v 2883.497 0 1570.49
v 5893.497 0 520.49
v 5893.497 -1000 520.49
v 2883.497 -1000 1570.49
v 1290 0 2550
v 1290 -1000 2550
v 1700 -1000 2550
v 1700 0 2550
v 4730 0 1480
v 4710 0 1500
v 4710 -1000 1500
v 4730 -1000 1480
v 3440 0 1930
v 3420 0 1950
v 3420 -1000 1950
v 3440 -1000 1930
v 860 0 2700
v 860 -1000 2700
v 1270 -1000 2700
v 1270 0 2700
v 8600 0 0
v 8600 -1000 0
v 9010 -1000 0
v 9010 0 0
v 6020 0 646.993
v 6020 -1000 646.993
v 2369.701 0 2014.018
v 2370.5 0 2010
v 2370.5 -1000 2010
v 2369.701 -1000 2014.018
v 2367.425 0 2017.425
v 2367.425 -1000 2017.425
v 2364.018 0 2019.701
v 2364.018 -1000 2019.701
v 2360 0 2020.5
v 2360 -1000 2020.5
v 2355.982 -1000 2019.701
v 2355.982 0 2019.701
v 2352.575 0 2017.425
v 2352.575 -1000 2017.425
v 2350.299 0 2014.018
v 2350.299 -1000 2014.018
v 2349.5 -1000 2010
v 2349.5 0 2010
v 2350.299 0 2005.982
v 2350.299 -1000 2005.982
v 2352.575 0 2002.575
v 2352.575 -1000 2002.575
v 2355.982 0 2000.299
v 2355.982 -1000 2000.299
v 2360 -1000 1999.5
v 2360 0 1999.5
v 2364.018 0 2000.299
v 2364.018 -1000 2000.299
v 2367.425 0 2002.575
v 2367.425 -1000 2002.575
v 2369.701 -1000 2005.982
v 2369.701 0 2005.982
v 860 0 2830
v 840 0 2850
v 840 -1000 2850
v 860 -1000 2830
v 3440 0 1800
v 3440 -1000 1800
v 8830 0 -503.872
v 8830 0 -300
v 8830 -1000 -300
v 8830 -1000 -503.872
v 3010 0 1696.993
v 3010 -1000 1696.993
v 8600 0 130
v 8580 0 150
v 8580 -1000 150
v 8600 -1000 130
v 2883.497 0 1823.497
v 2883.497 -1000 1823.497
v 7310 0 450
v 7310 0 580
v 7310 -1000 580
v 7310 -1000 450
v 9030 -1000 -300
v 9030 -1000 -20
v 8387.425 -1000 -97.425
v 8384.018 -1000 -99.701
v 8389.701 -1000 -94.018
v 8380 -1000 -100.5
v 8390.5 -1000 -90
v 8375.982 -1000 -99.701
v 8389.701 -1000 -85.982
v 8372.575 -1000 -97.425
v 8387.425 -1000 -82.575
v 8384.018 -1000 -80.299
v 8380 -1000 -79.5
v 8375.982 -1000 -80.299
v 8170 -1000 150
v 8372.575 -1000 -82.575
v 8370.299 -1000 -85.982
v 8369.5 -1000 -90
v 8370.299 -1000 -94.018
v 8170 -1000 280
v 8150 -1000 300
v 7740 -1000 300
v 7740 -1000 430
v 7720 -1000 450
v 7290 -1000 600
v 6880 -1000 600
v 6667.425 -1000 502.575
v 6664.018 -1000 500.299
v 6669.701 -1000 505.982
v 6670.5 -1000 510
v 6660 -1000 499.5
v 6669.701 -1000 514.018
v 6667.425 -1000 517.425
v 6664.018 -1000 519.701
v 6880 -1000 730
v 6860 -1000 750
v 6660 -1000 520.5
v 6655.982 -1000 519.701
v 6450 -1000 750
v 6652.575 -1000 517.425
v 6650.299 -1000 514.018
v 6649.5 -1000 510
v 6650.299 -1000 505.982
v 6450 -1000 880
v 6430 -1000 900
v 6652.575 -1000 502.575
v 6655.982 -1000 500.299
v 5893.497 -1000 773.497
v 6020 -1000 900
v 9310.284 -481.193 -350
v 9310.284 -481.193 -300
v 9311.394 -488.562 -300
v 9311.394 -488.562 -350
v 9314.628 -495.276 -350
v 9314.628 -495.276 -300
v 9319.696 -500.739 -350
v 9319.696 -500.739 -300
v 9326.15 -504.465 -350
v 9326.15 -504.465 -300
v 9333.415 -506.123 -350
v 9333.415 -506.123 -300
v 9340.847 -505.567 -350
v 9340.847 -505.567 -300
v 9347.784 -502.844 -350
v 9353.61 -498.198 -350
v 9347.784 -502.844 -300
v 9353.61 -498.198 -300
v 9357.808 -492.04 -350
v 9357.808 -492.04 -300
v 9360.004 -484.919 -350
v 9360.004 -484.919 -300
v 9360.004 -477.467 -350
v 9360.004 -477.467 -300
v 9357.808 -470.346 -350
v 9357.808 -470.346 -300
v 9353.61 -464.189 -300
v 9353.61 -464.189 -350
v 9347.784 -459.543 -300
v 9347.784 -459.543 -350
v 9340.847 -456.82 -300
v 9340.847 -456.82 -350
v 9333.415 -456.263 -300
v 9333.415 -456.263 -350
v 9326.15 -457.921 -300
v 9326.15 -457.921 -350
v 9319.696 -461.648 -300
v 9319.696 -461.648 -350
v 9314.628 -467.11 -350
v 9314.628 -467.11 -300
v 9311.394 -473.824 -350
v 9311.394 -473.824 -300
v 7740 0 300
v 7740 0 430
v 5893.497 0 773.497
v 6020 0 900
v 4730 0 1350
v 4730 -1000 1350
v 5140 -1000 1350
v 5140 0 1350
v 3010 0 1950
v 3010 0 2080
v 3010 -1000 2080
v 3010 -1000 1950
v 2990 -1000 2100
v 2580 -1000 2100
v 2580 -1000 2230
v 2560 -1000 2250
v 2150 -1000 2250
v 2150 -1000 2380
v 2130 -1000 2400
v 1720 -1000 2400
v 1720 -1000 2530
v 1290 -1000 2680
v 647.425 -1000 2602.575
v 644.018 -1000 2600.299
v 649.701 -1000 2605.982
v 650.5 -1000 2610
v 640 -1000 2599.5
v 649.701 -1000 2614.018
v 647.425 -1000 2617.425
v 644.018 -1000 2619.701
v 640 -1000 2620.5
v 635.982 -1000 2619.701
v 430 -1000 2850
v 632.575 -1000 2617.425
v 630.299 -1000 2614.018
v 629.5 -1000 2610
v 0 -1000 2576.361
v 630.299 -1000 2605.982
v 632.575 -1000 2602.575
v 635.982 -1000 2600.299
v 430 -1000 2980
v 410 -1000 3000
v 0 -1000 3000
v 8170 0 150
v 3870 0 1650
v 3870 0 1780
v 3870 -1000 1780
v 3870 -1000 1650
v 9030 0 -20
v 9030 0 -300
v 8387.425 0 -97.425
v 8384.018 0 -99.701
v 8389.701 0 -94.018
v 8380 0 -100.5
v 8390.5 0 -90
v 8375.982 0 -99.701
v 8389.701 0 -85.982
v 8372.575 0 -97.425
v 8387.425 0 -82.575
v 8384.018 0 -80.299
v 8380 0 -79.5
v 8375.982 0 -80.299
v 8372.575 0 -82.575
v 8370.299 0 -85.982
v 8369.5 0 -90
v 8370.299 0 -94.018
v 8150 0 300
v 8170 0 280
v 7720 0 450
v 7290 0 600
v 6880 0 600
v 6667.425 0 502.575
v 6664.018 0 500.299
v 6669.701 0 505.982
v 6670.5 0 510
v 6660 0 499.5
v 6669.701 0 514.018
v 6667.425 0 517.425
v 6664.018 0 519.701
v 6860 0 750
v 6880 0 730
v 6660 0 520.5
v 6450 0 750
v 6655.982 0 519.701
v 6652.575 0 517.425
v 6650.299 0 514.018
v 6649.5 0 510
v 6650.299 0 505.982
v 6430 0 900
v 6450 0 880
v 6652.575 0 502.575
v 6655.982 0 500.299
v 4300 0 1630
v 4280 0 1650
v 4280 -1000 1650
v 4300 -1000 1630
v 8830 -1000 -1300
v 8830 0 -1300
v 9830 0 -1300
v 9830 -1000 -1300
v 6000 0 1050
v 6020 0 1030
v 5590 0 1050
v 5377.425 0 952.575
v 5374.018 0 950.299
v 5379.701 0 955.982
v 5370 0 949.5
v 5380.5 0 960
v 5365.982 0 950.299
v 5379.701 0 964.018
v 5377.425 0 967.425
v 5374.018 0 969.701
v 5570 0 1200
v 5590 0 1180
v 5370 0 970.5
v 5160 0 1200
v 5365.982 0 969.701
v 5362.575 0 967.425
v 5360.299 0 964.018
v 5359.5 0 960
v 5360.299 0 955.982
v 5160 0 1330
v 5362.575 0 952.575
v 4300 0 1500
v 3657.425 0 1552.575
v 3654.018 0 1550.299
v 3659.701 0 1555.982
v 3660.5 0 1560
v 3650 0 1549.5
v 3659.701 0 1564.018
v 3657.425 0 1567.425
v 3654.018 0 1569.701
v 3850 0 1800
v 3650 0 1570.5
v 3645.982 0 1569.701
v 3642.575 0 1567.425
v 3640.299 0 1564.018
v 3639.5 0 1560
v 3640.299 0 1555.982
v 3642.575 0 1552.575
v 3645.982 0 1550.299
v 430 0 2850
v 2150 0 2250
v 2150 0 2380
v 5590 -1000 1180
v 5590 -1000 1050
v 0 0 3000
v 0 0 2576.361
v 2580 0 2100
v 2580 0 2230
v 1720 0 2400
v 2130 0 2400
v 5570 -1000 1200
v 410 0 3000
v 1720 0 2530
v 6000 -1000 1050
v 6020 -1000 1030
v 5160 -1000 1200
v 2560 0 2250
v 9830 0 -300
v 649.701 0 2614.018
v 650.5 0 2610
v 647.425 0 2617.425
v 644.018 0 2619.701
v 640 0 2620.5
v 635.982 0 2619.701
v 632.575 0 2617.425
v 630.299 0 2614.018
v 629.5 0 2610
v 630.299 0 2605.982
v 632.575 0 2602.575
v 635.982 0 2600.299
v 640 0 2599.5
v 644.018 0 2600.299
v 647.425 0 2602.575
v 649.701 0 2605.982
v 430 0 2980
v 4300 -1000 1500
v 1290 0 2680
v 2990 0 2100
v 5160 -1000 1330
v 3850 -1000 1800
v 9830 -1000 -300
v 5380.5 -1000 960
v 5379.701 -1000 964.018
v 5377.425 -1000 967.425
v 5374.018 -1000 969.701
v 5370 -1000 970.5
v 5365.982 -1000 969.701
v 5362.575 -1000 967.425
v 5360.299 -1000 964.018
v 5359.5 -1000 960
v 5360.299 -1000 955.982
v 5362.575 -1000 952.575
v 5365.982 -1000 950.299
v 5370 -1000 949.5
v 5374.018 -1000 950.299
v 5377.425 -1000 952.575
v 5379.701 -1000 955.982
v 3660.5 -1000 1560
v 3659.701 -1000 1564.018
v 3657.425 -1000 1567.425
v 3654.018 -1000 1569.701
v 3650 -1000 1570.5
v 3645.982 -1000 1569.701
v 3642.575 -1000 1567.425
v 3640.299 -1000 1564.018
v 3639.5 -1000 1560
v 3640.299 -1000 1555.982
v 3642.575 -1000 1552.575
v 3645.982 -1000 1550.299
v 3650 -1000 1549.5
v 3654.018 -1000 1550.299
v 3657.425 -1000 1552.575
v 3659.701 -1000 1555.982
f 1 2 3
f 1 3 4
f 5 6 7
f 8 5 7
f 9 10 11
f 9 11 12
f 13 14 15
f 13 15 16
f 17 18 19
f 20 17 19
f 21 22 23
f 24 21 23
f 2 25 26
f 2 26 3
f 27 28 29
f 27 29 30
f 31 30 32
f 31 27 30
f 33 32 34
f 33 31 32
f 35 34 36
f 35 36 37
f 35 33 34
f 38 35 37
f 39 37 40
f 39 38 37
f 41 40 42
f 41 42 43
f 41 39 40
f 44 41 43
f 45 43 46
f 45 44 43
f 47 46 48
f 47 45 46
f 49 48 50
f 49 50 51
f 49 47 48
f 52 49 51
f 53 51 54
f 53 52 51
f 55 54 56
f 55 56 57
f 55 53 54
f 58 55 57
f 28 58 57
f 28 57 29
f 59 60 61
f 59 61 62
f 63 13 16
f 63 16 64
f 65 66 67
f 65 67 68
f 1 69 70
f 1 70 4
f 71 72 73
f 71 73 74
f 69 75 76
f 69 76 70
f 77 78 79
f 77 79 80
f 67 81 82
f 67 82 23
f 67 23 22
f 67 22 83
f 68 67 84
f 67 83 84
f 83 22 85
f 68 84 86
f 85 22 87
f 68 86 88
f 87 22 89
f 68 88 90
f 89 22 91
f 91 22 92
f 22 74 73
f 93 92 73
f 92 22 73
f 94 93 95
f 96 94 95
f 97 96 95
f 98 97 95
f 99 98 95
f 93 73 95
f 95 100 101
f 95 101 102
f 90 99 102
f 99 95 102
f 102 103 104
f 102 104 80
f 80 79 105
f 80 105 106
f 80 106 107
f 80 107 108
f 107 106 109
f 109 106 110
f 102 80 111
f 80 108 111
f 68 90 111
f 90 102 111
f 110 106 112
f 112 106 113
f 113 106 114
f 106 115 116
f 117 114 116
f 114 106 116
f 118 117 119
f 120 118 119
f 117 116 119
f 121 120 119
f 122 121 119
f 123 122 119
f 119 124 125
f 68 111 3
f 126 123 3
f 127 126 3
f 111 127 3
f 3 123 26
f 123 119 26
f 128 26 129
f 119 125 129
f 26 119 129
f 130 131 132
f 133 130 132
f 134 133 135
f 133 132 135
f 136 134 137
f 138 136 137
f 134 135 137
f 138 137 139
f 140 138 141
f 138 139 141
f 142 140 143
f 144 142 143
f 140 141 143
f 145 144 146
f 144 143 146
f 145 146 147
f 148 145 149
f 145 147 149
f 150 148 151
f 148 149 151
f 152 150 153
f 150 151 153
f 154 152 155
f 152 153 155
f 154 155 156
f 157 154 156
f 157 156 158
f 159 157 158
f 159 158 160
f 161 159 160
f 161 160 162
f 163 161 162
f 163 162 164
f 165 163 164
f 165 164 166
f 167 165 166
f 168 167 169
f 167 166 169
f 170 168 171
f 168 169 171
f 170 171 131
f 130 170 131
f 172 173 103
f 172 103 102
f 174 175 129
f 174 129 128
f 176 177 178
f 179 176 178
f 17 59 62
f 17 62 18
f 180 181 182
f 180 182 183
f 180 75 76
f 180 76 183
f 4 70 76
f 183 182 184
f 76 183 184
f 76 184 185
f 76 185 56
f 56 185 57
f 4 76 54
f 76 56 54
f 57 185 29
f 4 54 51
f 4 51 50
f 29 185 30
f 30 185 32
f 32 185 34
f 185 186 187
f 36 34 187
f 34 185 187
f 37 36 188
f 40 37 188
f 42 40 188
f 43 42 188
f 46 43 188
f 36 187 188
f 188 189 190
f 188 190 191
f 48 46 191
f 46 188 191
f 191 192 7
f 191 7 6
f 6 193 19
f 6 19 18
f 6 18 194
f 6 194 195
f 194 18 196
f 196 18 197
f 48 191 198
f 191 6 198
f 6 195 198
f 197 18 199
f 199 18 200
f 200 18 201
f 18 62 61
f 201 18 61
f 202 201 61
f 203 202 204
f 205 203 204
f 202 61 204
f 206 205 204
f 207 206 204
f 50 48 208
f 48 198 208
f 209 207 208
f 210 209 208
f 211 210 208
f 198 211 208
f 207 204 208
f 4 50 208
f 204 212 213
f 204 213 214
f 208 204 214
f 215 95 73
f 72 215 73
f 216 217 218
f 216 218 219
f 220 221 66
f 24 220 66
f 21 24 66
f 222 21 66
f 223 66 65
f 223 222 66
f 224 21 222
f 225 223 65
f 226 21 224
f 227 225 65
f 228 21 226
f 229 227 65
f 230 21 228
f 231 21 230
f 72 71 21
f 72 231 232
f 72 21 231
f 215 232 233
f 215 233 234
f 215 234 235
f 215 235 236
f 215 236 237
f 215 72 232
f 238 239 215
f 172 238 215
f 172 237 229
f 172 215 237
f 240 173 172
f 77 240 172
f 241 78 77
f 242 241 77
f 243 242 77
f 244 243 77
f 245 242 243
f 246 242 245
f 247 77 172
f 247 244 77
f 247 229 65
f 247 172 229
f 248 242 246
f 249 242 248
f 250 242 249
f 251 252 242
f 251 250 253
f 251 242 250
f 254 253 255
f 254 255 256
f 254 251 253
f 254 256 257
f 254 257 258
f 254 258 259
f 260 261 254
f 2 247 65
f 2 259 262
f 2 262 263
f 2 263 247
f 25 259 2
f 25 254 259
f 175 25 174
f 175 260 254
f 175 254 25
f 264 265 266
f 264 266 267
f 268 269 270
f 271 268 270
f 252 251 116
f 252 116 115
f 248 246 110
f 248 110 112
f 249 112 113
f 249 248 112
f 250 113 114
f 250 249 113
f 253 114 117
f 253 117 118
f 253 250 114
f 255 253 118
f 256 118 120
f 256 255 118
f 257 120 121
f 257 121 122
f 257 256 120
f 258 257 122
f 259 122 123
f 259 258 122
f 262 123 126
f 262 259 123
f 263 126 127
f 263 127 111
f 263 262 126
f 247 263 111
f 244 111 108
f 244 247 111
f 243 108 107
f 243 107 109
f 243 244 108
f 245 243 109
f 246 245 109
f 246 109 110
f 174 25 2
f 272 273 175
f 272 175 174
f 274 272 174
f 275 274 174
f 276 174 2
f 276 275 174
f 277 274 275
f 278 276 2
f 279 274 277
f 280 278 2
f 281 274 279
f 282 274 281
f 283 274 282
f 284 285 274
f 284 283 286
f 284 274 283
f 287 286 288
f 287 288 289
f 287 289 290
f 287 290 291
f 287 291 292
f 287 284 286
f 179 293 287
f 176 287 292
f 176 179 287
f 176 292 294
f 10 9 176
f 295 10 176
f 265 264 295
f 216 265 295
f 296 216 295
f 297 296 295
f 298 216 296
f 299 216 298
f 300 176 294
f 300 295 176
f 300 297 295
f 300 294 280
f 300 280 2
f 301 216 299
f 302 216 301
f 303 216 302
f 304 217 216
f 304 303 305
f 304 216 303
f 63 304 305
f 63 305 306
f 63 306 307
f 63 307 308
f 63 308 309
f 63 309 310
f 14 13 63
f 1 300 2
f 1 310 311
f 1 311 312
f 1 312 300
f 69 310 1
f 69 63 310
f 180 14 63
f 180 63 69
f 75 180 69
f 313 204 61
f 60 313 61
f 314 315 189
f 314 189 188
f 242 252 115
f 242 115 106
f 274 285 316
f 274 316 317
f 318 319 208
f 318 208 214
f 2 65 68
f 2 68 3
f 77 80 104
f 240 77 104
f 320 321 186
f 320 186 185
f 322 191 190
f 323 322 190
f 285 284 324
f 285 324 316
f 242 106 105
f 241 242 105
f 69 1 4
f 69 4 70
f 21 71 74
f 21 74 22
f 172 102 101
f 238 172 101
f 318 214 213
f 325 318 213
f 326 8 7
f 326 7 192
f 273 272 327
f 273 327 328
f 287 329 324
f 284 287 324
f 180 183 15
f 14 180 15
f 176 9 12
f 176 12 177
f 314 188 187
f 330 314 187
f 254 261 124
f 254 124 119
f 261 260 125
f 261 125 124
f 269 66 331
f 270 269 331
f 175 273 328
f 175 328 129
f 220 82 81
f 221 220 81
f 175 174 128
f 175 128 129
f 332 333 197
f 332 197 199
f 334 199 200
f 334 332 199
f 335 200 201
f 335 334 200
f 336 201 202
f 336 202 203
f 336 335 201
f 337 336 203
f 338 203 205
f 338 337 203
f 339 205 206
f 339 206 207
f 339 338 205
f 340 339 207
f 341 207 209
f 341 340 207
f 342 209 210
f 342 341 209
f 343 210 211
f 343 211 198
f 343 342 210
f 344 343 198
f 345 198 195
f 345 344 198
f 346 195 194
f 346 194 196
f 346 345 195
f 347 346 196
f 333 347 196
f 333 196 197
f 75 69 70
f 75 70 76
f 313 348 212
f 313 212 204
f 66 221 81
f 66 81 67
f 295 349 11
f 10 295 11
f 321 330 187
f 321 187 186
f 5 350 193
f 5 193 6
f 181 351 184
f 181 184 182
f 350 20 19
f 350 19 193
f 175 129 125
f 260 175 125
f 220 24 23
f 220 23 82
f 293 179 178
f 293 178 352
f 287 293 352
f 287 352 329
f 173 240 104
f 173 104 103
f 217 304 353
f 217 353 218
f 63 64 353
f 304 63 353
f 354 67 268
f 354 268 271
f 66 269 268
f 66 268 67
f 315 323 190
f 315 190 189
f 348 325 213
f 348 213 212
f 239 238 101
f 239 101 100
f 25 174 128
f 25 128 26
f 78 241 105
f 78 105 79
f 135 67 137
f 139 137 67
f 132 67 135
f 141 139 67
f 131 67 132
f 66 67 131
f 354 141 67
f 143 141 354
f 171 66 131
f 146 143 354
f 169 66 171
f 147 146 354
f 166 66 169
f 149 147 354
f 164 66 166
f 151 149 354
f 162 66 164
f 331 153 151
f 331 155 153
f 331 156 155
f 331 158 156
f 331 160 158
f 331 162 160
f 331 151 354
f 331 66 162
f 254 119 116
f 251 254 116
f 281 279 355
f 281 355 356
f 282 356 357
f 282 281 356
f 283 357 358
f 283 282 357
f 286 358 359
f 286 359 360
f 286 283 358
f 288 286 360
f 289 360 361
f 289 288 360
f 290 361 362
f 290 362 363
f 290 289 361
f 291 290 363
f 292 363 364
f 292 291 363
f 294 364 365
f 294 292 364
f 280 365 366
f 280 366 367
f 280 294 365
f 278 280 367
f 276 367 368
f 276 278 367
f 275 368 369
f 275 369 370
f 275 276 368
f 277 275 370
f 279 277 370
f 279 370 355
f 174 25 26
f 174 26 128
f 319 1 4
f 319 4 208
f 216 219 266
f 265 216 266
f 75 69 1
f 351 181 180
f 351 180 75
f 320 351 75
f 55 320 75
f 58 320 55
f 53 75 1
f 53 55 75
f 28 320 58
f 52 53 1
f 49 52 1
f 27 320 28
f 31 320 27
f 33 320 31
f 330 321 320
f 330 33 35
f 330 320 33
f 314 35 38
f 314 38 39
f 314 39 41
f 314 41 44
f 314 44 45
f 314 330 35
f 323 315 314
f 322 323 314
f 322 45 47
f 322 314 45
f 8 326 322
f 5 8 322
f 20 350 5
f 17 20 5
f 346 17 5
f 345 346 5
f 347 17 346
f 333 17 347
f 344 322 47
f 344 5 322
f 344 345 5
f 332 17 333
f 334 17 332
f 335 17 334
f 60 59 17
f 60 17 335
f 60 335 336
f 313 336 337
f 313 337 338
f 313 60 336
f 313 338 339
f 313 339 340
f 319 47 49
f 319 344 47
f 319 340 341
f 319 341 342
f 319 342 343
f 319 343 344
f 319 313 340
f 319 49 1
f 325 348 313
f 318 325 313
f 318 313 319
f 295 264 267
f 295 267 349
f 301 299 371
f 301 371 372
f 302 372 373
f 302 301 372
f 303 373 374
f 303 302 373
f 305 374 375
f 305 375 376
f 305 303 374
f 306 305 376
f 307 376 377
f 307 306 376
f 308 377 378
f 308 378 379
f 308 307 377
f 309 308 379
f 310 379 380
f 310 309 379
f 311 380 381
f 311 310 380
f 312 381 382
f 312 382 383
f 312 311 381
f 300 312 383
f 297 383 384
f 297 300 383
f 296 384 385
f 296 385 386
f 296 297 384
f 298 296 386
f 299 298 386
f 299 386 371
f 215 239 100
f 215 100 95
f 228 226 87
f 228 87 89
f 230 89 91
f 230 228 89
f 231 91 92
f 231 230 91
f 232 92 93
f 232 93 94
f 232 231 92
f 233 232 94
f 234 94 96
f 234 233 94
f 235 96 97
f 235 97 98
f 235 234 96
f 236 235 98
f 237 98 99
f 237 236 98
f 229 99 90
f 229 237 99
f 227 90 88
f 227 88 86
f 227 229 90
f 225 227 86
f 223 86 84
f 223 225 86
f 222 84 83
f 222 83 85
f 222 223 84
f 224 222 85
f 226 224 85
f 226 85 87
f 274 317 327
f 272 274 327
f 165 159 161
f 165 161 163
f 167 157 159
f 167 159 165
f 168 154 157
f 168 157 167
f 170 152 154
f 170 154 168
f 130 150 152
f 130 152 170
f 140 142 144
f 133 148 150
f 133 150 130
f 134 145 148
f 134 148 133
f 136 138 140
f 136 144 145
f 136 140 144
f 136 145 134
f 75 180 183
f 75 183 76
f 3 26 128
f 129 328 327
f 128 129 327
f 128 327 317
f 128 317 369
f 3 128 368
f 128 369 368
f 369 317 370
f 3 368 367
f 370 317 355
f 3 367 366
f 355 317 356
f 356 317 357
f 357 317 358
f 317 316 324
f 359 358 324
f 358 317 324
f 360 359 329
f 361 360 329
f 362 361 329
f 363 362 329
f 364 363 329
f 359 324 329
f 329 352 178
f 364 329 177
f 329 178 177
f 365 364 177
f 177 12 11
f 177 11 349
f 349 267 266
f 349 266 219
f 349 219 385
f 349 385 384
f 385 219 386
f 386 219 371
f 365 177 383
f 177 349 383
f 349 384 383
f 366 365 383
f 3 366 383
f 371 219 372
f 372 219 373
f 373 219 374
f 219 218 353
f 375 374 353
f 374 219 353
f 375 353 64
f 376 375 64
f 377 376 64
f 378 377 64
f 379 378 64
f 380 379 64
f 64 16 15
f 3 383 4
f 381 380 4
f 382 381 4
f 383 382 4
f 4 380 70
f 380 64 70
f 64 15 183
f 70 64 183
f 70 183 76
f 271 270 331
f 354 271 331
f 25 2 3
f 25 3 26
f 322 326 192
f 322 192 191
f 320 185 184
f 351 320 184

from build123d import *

# Parameters (mm, degrees)
SKETCH001_R  = 10.5
PAD_DEPTH    = 1000
SKETCH002_R  = 10.5
PAD001_DEPTH = 1000
SKETCH003_R  = 10.5
PAD002_DEPTH = 1000
SKETCH004_W  = 1000
SKETCH004_H  = 1000
PAD003_DEPTH = 1000
SKETCH005_R  = 25
POCKET_DEPTH = 50


with BuildPart() as topsection:
    # Sketch001 → Pad (new body)
    with BuildSketch(Plane.XZ):
        Polygon((0, 3000), (410, 3000), (430, 2980), (430, 2850), (840, 2850), (860, 2830), (860, 2700), (1270, 2700), (1290, 2680), (1290, 2550), (1700, 2550), (1720, 2530), (1720, 2400), (2130, 2400), (2150, 2380), (2150, 2250), (2560, 2250), (2580, 2230), (2580, 2100), (2990, 2100), (3010, 2080), (3010, 1950), (2883.496694, 1823.496694), (3010, 1696.993388), (2883.496694, 1570.490082), (0, 2576.361022), align=None)
        with Locations((640, 2610)):
            Circle(SKETCH001_R, mode=Mode.SUBTRACT)
        with Locations((2360, 2010)):
            Circle(SKETCH001_R, mode=Mode.SUBTRACT)
    extrude(amount=PAD_DEPTH)


with BuildPart() as middlesection:
    # Sketch002 → Pad001 (new body)
    with BuildSketch(Plane.XZ):
        Polygon((3010, 1950), (3420, 1950), (3440, 1930), (3440, 1800), (3850, 1800), (3870, 1780), (3870, 1650), (4280, 1650), (4300, 1630), (4300, 1500), (4710, 1500), (4730, 1480), (4730, 1350), (5140, 1350), (5160, 1330), (5160, 1200), (5570, 1200), (5590, 1180), (5590, 1050), (6000, 1050), (6020, 1030), (6020, 900), (5893.496694, 773.496694), (6020, 646.993388), (5893.496694, 520.490082), (2883.496694, 1570.490082), (3010, 1696.993388), (2883.496694, 1823.496694), align=None)
        with Locations((3650, 1560)):
            Circle(SKETCH002_R, mode=Mode.SUBTRACT)
        with Locations((5370, 960)):
            Circle(SKETCH002_R, mode=Mode.SUBTRACT)
    extrude(amount=PAD001_DEPTH)


with BuildPart() as bottomsection:
    # Sketch003 → Pad002 (new body)
    with BuildSketch(Plane.XZ):
        Polygon((6020, 900), (6430, 900), (6450, 880), (6450, 750), (6860, 750), (6880, 730), (6880, 600), (7290, 600), (7310, 580), (7310, 450), (7720, 450), (7740, 430), (7740, 300), (8150, 300), (8170, 280), (8170, 150), (8580, 150), (8600, 130), (8600, 0), (9010, 0), (9030, -20), (9030, -300), (8830, -300), (8830, -503.871536), (5893.496694, 520.490082), (6020, 646.993388), (5893.496694, 773.496694), align=None)
        with Locations((8380, -90)):
            Circle(SKETCH003_R, mode=Mode.SUBTRACT)
        with Locations((6660, 510)):
            Circle(SKETCH003_R, mode=Mode.SUBTRACT)
    extrude(amount=PAD002_DEPTH)


with BuildPart() as socketsection:
    # Sketch004 → Pad003 (new body)
    with BuildSketch(Plane.XZ):
        with Locations((9330, -800)):
            Rectangle(SKETCH004_W, SKETCH004_H)
    extrude(amount=PAD003_DEPTH)

    # Sketch005 (on DatumPlane) → Pocket (cut)
    with BuildSketch(Plane(origin=(0, 0, -300), x_dir=(-1, 0, 0), z_dir=(0, 0, 1))):
        with Locations((-9335.283547, 481.193332)):
            Circle(SKETCH005_R)
    extrude(amount=-POCKET_DEPTH, mode=Mode.SUBTRACT)


solid = Compound([topsection.part, middlesection.part, bottomsection.part, socketsection.part])
